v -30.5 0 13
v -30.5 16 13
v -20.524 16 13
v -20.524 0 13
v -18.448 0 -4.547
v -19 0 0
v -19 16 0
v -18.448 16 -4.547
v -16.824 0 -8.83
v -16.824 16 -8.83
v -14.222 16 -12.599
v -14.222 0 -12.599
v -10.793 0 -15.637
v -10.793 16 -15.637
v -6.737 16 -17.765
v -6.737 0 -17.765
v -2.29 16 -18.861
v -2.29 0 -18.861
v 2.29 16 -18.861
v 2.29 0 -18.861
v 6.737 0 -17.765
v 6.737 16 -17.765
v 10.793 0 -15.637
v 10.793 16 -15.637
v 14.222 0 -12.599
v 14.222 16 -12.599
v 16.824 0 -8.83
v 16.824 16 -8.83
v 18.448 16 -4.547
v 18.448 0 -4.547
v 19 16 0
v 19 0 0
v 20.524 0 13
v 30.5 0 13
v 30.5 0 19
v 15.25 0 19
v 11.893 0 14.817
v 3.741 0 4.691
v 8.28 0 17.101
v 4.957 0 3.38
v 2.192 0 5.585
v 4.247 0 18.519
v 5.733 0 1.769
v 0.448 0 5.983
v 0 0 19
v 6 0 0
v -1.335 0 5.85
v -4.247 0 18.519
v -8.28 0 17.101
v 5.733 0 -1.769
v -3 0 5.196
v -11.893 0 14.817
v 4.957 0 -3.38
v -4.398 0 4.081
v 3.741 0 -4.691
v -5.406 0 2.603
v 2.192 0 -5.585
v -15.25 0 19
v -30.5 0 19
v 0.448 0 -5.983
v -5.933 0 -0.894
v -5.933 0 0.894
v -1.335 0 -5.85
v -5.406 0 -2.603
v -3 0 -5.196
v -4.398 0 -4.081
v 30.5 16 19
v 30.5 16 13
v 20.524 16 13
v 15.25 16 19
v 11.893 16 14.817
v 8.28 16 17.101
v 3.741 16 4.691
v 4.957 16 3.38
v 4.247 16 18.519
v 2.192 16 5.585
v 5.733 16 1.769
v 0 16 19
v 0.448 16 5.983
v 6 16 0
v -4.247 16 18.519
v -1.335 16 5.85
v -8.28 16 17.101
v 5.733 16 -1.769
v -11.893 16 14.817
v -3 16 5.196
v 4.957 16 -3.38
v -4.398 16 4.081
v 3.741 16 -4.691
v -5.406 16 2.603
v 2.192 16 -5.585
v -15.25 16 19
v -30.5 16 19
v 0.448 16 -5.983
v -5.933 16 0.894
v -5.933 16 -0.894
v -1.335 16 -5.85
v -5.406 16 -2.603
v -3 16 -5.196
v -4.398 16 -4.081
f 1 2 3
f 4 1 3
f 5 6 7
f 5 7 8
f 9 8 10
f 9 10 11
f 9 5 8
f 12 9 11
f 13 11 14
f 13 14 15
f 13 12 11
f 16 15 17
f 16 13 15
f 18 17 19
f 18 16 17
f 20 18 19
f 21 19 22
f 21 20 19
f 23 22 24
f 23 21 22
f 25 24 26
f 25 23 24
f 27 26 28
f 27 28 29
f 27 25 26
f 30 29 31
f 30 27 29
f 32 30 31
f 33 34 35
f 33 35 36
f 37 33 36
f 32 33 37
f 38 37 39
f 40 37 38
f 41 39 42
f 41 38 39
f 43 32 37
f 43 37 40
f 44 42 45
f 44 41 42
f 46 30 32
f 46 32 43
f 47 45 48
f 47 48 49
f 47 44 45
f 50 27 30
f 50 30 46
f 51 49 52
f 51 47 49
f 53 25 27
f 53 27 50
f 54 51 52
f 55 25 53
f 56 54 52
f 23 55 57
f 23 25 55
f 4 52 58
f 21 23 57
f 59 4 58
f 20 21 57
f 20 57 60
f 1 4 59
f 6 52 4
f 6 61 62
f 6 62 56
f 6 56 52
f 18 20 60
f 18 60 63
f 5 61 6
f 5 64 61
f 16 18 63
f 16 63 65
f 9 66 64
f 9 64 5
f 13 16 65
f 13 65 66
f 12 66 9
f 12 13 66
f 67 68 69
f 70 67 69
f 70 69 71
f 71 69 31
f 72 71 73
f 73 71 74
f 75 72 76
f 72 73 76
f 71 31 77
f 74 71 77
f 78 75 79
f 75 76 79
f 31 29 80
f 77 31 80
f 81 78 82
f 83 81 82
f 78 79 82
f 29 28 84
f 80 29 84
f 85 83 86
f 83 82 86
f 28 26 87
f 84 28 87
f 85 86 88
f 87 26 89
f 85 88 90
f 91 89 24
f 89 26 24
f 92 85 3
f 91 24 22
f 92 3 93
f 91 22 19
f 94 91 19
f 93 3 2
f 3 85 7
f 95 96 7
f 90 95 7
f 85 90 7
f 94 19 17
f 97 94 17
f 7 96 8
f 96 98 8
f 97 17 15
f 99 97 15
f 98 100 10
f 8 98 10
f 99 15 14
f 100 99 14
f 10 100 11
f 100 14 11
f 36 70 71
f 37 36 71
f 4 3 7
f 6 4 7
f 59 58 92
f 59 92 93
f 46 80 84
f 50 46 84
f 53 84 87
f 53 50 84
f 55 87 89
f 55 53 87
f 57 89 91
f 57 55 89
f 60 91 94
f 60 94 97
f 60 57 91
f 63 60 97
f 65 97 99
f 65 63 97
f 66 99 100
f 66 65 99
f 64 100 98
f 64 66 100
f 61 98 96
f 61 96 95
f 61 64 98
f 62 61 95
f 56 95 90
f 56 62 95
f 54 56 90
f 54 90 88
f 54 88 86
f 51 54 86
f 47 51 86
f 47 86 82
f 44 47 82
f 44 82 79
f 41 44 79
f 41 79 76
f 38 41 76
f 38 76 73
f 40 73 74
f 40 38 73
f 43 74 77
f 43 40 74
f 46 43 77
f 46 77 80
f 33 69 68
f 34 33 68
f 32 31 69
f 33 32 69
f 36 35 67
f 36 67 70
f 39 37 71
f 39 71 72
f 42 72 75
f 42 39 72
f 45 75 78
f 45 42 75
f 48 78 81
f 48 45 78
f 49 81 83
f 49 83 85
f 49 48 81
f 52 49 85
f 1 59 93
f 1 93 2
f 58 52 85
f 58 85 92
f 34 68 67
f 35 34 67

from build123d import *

# Parameters (mm, degrees)
SKETCH2_R           = 6
BOSS_EXTRUDE2_DEPTH = 16


with BuildPart() as part:
    # Sketch2 → Boss-Extrude2 (new body)
    with BuildSketch(Plane(origin=(0, 0, 0), x_dir=(1, 0, 0), z_dir=(0, 1, 0))):
        with BuildLine():
            Line((-15.25, -19), (-30.5, -19))
            Line((-30.5, -19), (-30.5, -13))
            Line((-30.5, -13), (-20.524290918, -13))
            Line((-20.524290918, -13), (-19, 0))
            ThreePointArc((-19, 0), (0, 19), (19, 0))
            Line((19, 0), (20.524290918, -13))
            Line((20.524290918, -13), (30.5, -13))
            Line((30.5, -13), (30.5, -19))
            Line((30.5, -19), (15.25, -19))
            Line((15.25, -19), (11.892967086, -14.817467189))
            ThreePointArc((11.892967086, -14.817467189), (0, -19), (-11.892967086, -14.817467189))
            Line((-11.892967086, -14.817467189), (-15.25, -19))
        make_face()
        Circle(SKETCH2_R, mode=Mode.SUBTRACT)
    extrude(amount=BOSS_EXTRUDE2_DEPTH)


solid = part.part
